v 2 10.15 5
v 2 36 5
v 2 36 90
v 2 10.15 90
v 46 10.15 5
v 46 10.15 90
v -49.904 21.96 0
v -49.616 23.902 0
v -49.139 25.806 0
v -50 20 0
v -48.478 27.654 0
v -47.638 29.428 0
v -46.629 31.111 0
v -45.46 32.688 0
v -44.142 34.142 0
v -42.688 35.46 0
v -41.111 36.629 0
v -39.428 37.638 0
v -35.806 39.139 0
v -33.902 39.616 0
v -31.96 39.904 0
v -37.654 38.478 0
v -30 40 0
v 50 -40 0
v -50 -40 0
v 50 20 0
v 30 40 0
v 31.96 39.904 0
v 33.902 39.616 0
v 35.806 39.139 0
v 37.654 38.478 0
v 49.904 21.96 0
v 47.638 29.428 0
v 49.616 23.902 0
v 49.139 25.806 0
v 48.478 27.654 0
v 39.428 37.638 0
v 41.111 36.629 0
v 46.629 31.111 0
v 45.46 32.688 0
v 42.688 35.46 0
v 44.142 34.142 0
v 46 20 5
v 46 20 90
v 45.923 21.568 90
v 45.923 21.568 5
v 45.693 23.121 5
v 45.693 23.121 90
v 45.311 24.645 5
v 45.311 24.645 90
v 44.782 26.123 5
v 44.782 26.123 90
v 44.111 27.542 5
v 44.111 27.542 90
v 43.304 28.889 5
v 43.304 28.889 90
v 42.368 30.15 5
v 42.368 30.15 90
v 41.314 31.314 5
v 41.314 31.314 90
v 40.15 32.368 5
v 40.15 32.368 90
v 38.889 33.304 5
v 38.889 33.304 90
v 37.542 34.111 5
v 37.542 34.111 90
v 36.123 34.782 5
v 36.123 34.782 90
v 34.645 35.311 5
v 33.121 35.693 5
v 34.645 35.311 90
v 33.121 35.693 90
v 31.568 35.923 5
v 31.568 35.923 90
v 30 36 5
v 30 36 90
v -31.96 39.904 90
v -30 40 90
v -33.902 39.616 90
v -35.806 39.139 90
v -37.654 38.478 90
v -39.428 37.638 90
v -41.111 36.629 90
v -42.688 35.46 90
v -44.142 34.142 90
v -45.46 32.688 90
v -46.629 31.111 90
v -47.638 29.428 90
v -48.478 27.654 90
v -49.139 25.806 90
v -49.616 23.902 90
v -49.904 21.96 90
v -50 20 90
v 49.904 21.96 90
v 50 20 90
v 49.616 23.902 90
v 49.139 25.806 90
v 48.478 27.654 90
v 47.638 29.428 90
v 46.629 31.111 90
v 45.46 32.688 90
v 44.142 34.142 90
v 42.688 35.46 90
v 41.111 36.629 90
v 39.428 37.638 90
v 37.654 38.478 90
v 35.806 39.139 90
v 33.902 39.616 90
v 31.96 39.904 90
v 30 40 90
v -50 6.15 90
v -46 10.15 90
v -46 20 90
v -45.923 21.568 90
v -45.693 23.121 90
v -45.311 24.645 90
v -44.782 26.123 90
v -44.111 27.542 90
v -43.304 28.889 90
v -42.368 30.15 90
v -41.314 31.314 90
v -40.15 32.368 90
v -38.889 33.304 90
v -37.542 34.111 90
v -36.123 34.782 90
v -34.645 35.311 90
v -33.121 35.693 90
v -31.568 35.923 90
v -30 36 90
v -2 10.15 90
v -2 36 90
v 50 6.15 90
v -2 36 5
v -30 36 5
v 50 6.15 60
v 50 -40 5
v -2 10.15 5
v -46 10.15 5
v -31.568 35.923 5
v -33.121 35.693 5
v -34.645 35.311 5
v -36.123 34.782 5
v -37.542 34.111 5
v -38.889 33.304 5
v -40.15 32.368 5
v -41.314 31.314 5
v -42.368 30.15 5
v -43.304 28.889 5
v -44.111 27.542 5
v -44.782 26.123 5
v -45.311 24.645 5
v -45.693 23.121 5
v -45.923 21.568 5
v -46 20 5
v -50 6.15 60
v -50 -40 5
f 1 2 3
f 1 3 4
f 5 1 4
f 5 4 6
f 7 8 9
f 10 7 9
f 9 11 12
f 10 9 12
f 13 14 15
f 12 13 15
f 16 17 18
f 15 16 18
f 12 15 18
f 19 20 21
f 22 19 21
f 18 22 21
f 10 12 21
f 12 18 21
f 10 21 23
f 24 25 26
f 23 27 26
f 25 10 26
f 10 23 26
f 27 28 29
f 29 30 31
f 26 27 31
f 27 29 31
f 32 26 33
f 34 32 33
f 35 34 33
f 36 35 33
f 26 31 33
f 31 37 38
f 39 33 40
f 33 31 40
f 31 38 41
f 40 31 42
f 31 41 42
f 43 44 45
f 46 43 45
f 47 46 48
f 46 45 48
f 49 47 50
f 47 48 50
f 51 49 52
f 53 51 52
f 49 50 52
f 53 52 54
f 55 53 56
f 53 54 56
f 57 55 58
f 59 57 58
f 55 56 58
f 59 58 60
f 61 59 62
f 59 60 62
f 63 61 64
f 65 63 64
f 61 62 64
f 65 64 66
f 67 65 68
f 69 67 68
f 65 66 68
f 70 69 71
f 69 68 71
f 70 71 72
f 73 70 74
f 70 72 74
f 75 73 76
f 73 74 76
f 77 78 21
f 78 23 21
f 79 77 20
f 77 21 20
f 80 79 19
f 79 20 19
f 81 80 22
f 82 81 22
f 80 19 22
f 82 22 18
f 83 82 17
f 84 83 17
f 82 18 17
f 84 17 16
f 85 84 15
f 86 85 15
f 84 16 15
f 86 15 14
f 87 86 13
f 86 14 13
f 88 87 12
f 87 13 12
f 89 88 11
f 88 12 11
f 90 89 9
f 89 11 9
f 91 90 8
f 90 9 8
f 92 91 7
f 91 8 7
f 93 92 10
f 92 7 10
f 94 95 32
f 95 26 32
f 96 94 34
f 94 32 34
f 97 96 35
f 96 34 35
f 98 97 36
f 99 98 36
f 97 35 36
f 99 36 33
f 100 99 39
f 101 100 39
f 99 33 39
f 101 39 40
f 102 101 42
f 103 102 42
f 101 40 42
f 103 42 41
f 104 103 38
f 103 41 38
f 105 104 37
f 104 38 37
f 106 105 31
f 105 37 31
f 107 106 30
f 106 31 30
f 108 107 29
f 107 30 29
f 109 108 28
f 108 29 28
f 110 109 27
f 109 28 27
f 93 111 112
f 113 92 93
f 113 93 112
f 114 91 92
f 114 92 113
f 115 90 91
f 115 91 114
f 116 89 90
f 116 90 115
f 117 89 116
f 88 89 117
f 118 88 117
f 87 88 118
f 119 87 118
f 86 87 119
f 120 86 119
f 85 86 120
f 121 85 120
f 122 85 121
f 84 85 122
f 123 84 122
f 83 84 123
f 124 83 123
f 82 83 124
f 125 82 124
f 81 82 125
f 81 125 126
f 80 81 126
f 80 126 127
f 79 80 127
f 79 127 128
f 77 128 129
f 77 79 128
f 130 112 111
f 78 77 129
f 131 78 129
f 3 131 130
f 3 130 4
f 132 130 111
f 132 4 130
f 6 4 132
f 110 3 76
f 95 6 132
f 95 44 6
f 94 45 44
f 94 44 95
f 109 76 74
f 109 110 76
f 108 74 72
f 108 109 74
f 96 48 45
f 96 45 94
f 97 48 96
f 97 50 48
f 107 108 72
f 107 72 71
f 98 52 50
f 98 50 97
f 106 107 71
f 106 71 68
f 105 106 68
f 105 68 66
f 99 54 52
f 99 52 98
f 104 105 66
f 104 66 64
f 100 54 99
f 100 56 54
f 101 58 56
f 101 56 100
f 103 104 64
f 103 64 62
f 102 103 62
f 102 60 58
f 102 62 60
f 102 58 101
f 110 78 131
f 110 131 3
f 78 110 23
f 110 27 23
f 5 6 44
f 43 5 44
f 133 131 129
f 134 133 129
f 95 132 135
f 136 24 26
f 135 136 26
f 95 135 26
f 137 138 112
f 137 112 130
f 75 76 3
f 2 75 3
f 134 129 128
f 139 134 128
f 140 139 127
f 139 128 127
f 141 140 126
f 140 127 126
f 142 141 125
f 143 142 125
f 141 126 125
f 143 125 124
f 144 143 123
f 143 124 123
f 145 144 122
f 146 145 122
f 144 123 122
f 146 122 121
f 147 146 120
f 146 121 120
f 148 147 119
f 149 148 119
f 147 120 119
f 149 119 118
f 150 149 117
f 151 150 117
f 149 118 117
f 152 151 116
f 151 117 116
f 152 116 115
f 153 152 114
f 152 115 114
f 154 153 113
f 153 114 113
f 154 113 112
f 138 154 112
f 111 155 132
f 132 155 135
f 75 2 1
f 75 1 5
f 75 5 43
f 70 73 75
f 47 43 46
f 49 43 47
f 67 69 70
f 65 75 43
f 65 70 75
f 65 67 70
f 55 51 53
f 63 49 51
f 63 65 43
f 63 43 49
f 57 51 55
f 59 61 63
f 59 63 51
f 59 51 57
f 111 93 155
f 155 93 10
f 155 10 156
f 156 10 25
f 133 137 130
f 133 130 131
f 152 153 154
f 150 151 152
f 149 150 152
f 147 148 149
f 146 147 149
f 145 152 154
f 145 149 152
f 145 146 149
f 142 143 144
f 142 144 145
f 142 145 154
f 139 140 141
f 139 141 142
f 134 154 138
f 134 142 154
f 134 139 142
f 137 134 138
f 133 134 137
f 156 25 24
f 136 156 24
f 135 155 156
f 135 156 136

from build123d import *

# Parameters (mm, degrees)
F1_DEPTH = 60
F2_SIZE2 = 46.1504797148
F2_SIZE  = 55
F3_DEPTH = 30
F5_DEPTH = 85


with BuildPart() as f1:
    # F0 (on Top) → F1 (new body)
    with BuildSketch(Plane.XY):
        with BuildLine():
            Line((-50, -40), (50, -40))
            Line((50, -40), (50, 20))
            ThreePointArc((50, 20), (44.1421356237, 34.1421356237), (30, 40))
            Line((30, 40), (-30, 40))
            ThreePointArc((-30, 40), (-44.1421356237, 34.1421356237), (-50, 20))
            Line((-50, 20), (-50, -40))
        make_face()
    extrude(amount=F1_DEPTH)

    # F2
    f2_edges = [f1.edges().sort_by_distance(p)[0] for p in [
        (0, -40, 60),
    ]]
    f2_side = f1.faces().sort_by_distance((0, -40, 30))[0]
    chamfer(f2_edges, length=F2_SIZE, length2=F2_SIZE2, reference=f2_side)

    # F3 (add): a face of the model
    f3_faces = [f1.faces().sort_by_distance(p)[0] for p in [
        (0, 22.4096547689, 60),
    ]]
    extrude(f3_faces, amount=F3_DEPTH)

    # F4 (on face) → F5 (cut)
    with BuildSketch(Plane.XY.offset(90)):
        with BuildLine():
            Line((30, 36), (2, 36))
            Line((2, 36), (2, 10.1504797148))
            Line((2, 10.1504797148), (46, 10.1504797148))
            Line((46, 10.1504797148), (46, 20))
            ThreePointArc((46, 20), (41.313708499, 31.313708499), (30, 36))
        make_face()
        with BuildLine():
            Line((-2, 36), (-30, 36))
            ThreePointArc((-30, 36), (-41.313708499, 31.313708499), (-46, 20))
            Line((-46, 20), (-46, 10.1504797148))
            Line((-46, 10.1504797148), (-2, 10.1504797148))
            Line((-2, 10.1504797148), (-2, 36))
        make_face()
    extrude(amount=-F5_DEPTH, mode=Mode.SUBTRACT)


solid = f1.part
